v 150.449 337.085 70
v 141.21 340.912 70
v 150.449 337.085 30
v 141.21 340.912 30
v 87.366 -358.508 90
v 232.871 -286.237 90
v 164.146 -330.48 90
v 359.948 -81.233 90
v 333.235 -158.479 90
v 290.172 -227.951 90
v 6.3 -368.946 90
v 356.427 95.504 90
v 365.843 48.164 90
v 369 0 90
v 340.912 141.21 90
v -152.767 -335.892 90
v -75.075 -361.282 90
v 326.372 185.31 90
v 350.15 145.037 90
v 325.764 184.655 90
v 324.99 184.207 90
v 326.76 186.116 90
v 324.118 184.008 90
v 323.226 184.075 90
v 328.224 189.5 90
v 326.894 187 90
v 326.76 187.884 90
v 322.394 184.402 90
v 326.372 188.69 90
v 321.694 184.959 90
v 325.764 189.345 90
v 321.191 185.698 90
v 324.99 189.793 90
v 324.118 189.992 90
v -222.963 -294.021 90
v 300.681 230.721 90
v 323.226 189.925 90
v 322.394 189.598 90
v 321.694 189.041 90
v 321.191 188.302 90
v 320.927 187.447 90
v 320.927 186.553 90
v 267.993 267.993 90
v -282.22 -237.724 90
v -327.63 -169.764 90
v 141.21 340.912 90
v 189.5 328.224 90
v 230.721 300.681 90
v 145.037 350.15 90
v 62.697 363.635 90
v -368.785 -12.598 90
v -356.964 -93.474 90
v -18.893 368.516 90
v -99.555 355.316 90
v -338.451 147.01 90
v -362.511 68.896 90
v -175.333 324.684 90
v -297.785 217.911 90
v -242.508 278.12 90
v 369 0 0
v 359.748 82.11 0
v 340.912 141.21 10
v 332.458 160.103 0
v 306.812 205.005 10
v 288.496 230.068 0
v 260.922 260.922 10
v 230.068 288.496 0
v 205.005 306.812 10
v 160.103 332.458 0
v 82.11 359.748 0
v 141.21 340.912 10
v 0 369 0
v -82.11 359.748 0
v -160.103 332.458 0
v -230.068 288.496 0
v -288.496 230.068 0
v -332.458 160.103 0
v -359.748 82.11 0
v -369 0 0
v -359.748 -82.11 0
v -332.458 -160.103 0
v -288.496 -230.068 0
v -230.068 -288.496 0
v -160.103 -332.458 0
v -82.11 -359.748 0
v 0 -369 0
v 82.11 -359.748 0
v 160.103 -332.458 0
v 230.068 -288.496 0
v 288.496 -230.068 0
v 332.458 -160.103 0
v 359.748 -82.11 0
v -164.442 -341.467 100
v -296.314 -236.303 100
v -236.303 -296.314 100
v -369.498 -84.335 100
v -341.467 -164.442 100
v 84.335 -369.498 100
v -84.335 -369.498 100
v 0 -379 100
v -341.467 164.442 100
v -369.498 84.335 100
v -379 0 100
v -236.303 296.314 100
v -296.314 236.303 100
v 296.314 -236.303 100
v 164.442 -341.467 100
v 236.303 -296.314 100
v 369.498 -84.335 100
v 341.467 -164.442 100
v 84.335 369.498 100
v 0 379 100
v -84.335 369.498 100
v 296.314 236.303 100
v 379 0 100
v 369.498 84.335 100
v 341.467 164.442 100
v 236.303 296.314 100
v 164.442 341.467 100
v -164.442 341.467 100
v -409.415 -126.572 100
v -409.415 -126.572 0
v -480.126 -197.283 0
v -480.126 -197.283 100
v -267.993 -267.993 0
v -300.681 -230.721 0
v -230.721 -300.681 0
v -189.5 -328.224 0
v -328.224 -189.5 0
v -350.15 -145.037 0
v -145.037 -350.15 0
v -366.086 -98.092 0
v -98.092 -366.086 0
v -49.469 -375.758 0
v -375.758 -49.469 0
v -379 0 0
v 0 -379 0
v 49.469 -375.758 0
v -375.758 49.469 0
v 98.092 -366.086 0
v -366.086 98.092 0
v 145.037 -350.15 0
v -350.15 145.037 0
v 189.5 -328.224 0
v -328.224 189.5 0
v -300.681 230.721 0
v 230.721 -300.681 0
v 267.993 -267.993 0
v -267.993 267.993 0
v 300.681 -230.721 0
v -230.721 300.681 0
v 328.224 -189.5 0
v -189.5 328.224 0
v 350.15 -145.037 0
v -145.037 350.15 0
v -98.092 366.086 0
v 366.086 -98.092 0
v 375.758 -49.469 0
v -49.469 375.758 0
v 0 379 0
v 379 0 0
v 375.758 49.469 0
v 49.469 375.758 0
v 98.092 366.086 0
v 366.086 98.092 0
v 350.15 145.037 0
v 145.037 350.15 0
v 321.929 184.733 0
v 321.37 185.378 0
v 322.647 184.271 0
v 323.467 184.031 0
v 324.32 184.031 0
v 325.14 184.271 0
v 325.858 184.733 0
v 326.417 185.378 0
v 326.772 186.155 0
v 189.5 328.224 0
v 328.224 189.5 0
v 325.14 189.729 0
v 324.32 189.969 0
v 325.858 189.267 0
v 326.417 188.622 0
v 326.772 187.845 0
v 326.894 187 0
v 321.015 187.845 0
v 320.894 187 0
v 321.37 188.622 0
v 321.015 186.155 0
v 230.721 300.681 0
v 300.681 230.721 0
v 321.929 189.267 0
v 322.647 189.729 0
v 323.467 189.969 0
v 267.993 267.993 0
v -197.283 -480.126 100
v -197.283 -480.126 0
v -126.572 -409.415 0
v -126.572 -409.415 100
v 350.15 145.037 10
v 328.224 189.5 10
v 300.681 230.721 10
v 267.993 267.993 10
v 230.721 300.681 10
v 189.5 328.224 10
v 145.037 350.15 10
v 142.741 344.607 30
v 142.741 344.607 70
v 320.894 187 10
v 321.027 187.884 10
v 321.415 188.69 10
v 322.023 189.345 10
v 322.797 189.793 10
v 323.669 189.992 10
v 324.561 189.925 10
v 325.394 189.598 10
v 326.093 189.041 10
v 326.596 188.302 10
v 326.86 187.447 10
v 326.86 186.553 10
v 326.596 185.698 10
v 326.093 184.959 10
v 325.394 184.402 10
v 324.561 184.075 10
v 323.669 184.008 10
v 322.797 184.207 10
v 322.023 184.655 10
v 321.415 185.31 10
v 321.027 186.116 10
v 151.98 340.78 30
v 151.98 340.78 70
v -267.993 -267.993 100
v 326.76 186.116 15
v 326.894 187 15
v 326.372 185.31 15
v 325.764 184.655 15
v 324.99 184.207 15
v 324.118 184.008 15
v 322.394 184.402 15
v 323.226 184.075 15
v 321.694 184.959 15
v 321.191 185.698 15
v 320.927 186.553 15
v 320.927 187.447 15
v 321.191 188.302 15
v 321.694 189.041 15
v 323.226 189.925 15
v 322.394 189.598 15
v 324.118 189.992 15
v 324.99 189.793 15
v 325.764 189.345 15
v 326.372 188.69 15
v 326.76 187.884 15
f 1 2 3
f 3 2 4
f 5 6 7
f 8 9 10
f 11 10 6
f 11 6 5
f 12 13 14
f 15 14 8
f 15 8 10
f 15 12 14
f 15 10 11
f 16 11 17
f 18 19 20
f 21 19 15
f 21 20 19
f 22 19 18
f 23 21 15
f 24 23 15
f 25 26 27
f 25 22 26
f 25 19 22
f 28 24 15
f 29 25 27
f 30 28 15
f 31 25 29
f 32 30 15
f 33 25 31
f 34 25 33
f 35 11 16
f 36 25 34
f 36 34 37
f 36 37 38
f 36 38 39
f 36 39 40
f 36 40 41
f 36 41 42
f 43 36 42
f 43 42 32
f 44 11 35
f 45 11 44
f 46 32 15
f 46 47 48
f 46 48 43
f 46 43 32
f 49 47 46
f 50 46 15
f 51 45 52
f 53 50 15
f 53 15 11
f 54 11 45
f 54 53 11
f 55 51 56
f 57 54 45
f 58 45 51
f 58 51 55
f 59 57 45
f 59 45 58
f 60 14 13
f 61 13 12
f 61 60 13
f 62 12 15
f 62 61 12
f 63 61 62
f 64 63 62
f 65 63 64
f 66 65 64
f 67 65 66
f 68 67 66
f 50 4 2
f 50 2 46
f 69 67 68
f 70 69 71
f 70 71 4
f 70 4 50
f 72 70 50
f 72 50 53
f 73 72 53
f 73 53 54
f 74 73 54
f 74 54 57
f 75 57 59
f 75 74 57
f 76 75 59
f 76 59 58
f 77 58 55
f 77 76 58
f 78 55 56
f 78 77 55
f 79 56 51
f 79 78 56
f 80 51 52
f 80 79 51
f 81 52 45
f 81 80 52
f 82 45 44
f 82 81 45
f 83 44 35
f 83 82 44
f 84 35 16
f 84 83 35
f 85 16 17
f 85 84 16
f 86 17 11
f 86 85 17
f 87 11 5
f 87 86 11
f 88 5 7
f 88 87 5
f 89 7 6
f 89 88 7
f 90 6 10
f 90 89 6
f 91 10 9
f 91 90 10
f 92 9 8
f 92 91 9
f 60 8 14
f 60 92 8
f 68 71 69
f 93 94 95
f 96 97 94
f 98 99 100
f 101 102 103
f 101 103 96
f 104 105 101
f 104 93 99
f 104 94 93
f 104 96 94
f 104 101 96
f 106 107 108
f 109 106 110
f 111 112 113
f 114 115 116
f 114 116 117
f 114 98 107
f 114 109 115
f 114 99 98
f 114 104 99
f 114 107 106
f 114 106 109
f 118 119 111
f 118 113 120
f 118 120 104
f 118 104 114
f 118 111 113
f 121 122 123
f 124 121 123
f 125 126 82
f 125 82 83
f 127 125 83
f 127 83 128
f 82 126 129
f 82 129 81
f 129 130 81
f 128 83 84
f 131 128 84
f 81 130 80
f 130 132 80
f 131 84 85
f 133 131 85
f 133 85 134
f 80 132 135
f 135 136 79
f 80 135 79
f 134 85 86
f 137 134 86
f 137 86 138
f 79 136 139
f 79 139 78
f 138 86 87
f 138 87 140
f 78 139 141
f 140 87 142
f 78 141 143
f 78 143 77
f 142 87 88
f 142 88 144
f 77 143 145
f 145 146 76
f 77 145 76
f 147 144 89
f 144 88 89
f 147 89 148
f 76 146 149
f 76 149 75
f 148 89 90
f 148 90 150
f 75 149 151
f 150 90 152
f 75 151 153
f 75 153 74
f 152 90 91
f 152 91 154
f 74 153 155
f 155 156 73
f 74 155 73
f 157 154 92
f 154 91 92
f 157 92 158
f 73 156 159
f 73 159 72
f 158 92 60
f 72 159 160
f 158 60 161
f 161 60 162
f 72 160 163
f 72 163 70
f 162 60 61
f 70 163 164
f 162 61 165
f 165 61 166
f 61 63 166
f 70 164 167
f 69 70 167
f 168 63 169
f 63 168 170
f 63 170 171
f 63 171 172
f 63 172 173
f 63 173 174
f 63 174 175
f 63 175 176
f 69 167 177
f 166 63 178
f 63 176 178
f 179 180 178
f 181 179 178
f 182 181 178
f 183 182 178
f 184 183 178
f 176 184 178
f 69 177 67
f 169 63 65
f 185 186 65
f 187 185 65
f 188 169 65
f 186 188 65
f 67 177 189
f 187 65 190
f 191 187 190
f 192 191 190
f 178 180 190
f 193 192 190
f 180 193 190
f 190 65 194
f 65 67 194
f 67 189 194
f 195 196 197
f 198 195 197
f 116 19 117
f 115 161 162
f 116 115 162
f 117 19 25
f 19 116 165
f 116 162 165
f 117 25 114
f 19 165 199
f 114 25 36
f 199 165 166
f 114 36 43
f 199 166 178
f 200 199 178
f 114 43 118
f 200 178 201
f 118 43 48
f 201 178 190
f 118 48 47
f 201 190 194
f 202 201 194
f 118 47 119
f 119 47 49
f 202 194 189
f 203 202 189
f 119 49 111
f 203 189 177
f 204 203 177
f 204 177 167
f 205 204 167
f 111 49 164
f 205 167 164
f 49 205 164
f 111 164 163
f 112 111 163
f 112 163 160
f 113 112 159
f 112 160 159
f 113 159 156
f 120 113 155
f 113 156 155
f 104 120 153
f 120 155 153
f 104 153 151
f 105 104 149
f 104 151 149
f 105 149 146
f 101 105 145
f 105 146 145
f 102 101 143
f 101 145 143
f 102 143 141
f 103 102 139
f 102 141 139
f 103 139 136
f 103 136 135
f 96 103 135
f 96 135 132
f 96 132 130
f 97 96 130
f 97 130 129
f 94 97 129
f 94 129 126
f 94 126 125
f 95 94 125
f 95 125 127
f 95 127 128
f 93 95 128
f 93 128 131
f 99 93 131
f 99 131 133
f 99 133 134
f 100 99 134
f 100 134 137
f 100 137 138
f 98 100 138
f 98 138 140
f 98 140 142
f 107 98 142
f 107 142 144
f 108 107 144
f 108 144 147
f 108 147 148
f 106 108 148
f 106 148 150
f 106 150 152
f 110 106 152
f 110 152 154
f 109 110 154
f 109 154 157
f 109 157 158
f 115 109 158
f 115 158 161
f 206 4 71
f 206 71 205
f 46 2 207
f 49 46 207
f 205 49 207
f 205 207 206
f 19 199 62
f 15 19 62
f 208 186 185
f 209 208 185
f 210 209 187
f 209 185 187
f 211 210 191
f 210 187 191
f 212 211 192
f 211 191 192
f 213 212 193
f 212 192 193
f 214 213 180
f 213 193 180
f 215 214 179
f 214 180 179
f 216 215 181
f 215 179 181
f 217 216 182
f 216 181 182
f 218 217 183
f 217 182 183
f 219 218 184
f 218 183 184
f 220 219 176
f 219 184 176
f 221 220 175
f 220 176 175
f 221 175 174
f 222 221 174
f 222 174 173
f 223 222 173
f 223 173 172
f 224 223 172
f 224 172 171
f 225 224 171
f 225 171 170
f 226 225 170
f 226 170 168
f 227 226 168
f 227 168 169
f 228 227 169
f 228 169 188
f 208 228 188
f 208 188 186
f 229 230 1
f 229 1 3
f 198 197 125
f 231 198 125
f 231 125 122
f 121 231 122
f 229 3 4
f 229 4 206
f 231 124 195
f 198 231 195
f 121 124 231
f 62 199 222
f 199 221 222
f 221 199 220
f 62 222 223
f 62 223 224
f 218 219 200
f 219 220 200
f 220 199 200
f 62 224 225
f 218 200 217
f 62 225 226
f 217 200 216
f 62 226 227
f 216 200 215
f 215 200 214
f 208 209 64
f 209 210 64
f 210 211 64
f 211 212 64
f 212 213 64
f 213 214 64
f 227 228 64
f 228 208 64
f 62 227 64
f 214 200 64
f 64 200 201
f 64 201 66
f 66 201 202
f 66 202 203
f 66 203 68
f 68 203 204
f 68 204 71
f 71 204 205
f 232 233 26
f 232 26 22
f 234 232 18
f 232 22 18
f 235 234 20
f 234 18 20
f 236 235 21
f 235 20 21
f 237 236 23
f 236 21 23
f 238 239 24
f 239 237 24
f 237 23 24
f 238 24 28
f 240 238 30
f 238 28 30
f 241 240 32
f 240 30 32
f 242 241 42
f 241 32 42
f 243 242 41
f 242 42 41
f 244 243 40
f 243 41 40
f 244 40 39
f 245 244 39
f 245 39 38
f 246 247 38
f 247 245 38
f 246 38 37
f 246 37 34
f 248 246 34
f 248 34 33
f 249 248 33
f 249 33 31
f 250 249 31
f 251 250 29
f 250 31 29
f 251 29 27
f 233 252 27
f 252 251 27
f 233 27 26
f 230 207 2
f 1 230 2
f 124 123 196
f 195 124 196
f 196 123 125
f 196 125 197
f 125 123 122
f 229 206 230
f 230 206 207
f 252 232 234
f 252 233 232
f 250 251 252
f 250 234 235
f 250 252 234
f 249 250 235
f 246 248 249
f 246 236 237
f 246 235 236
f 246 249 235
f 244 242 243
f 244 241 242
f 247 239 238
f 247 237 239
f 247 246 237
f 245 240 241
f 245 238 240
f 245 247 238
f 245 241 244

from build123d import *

# Parameters (mm, degrees)
BOSS_EXTRU_1_DEPTH       = 100
ESQUISSE1_R              = 379
BOSS_EXTRU_1_2_DEPTH     = 100
COQUE3_T                 = -10
ENL_V_MAT_EXTRU_4_DEPTH  = 80
BOSS_EXTRU_3_DEPTH       = 85
BOSS_EXTRU_3_DEPTH_BACK  = 5
ESQUISSE5_R              = 3
ESQUISSE7_R              = 3
ENL_V_MAT_EXTRU_12_DEPTH = 15
BOSS_EXTRU_27_DEPTH      = 10


with BuildPart() as part:
    # Esquisse1 → Boss.-Extru.1 (new body)
    with BuildSketch(Plane.XY):
        Polygon((-126.572113832, -409.414826307), (-267.99347007, -267.99347007), (-409.414826307, -126.572113832), (-480.125504426, -197.282791951), (-197.282791951, -480.125504426), align=None)
    extrude(amount=BOSS_EXTRU_1_DEPTH)


with BuildPart() as body_2:
    # Esquisse1 → Boss.-Extru.1 2 (new body)
    with BuildSketch(Plane.XY):
        Circle(ESQUISSE1_R)
    extrude(amount=BOSS_EXTRU_1_2_DEPTH)

    # Coque3
    coque3_openings = [body_2.faces().sort_by_distance(p)[0] for p in [
        (0, 0, 0),
    ]]
    offset(amount=COQUE3_T, openings=coque3_openings, kind=Kind.INTERSECTION)

    # Esquisse3 → Enlèv. mat.-Extru.4 (cut)
    with BuildSketch(Plane(origin=(0, 0, 90), x_dir=(-1, 0, 0), z_dir=(0, 0, -1))):
        with BuildLine():
            Line((-350.150342822, 145.037020866), (0, 0))
            Line((0, 0), (-145.037020866, 350.150342822))
            ThreePointArc((-145.037020866, 350.150342822), (-210.561118314, 315.126983063), (-267.99347007, 267.99347007))
            ThreePointArc((-267.99347007, 267.99347007), (-315.126983063, 210.561118314), (-350.150342822, 145.037020866))
        make_face()
    extrude(amount=ENL_V_MAT_EXTRU_4_DEPTH, mode=Mode.SUBTRACT)

    # Esquisse5 → Boss.-Extru.3 (add, two sides: drawn at the far end of the back side and taken through both)
    with BuildSketch(Plane(origin=(0, 0, 90), x_dir=(-1, 0, 0), z_dir=(0, 0, -1)).offset(-BOSS_EXTRU_3_DEPTH_BACK)):
        with Locations(Location((-323.893501015, 187, 0), (0, 0, 180))):
            Circle(ESQUISSE5_R)
    extrude(amount=BOSS_EXTRU_3_DEPTH + BOSS_EXTRU_3_DEPTH_BACK)

    # Esquisse7 → Enlèv. mat.-Extru.12 (cut)
    with BuildSketch(Plane(origin=(0, 0, 0), x_dir=(-1, 0, 0), z_dir=(0, 0, -1))):
        with Locations((-323.893501015, 187)):
            Circle(ESQUISSE7_R)
    extrude(amount=-ENL_V_MAT_EXTRU_12_DEPTH, mode=Mode.SUBTRACT)

    # Esquisse12 → Boss.-Extru.27 (add)
    with BuildSketch(Plane(origin=(0, 0, 0), x_dir=(0, 0, -1), z_dir=(0.9238795325112816, -0.3826834323651025, 0))):
        Polygon((-70, 373), (-70, 369), (-50, 369), (-30, 369), (-30, 373), align=None)
    extrude(amount=BOSS_EXTRU_27_DEPTH)


solid = Compound([part.part, body_2.part])
